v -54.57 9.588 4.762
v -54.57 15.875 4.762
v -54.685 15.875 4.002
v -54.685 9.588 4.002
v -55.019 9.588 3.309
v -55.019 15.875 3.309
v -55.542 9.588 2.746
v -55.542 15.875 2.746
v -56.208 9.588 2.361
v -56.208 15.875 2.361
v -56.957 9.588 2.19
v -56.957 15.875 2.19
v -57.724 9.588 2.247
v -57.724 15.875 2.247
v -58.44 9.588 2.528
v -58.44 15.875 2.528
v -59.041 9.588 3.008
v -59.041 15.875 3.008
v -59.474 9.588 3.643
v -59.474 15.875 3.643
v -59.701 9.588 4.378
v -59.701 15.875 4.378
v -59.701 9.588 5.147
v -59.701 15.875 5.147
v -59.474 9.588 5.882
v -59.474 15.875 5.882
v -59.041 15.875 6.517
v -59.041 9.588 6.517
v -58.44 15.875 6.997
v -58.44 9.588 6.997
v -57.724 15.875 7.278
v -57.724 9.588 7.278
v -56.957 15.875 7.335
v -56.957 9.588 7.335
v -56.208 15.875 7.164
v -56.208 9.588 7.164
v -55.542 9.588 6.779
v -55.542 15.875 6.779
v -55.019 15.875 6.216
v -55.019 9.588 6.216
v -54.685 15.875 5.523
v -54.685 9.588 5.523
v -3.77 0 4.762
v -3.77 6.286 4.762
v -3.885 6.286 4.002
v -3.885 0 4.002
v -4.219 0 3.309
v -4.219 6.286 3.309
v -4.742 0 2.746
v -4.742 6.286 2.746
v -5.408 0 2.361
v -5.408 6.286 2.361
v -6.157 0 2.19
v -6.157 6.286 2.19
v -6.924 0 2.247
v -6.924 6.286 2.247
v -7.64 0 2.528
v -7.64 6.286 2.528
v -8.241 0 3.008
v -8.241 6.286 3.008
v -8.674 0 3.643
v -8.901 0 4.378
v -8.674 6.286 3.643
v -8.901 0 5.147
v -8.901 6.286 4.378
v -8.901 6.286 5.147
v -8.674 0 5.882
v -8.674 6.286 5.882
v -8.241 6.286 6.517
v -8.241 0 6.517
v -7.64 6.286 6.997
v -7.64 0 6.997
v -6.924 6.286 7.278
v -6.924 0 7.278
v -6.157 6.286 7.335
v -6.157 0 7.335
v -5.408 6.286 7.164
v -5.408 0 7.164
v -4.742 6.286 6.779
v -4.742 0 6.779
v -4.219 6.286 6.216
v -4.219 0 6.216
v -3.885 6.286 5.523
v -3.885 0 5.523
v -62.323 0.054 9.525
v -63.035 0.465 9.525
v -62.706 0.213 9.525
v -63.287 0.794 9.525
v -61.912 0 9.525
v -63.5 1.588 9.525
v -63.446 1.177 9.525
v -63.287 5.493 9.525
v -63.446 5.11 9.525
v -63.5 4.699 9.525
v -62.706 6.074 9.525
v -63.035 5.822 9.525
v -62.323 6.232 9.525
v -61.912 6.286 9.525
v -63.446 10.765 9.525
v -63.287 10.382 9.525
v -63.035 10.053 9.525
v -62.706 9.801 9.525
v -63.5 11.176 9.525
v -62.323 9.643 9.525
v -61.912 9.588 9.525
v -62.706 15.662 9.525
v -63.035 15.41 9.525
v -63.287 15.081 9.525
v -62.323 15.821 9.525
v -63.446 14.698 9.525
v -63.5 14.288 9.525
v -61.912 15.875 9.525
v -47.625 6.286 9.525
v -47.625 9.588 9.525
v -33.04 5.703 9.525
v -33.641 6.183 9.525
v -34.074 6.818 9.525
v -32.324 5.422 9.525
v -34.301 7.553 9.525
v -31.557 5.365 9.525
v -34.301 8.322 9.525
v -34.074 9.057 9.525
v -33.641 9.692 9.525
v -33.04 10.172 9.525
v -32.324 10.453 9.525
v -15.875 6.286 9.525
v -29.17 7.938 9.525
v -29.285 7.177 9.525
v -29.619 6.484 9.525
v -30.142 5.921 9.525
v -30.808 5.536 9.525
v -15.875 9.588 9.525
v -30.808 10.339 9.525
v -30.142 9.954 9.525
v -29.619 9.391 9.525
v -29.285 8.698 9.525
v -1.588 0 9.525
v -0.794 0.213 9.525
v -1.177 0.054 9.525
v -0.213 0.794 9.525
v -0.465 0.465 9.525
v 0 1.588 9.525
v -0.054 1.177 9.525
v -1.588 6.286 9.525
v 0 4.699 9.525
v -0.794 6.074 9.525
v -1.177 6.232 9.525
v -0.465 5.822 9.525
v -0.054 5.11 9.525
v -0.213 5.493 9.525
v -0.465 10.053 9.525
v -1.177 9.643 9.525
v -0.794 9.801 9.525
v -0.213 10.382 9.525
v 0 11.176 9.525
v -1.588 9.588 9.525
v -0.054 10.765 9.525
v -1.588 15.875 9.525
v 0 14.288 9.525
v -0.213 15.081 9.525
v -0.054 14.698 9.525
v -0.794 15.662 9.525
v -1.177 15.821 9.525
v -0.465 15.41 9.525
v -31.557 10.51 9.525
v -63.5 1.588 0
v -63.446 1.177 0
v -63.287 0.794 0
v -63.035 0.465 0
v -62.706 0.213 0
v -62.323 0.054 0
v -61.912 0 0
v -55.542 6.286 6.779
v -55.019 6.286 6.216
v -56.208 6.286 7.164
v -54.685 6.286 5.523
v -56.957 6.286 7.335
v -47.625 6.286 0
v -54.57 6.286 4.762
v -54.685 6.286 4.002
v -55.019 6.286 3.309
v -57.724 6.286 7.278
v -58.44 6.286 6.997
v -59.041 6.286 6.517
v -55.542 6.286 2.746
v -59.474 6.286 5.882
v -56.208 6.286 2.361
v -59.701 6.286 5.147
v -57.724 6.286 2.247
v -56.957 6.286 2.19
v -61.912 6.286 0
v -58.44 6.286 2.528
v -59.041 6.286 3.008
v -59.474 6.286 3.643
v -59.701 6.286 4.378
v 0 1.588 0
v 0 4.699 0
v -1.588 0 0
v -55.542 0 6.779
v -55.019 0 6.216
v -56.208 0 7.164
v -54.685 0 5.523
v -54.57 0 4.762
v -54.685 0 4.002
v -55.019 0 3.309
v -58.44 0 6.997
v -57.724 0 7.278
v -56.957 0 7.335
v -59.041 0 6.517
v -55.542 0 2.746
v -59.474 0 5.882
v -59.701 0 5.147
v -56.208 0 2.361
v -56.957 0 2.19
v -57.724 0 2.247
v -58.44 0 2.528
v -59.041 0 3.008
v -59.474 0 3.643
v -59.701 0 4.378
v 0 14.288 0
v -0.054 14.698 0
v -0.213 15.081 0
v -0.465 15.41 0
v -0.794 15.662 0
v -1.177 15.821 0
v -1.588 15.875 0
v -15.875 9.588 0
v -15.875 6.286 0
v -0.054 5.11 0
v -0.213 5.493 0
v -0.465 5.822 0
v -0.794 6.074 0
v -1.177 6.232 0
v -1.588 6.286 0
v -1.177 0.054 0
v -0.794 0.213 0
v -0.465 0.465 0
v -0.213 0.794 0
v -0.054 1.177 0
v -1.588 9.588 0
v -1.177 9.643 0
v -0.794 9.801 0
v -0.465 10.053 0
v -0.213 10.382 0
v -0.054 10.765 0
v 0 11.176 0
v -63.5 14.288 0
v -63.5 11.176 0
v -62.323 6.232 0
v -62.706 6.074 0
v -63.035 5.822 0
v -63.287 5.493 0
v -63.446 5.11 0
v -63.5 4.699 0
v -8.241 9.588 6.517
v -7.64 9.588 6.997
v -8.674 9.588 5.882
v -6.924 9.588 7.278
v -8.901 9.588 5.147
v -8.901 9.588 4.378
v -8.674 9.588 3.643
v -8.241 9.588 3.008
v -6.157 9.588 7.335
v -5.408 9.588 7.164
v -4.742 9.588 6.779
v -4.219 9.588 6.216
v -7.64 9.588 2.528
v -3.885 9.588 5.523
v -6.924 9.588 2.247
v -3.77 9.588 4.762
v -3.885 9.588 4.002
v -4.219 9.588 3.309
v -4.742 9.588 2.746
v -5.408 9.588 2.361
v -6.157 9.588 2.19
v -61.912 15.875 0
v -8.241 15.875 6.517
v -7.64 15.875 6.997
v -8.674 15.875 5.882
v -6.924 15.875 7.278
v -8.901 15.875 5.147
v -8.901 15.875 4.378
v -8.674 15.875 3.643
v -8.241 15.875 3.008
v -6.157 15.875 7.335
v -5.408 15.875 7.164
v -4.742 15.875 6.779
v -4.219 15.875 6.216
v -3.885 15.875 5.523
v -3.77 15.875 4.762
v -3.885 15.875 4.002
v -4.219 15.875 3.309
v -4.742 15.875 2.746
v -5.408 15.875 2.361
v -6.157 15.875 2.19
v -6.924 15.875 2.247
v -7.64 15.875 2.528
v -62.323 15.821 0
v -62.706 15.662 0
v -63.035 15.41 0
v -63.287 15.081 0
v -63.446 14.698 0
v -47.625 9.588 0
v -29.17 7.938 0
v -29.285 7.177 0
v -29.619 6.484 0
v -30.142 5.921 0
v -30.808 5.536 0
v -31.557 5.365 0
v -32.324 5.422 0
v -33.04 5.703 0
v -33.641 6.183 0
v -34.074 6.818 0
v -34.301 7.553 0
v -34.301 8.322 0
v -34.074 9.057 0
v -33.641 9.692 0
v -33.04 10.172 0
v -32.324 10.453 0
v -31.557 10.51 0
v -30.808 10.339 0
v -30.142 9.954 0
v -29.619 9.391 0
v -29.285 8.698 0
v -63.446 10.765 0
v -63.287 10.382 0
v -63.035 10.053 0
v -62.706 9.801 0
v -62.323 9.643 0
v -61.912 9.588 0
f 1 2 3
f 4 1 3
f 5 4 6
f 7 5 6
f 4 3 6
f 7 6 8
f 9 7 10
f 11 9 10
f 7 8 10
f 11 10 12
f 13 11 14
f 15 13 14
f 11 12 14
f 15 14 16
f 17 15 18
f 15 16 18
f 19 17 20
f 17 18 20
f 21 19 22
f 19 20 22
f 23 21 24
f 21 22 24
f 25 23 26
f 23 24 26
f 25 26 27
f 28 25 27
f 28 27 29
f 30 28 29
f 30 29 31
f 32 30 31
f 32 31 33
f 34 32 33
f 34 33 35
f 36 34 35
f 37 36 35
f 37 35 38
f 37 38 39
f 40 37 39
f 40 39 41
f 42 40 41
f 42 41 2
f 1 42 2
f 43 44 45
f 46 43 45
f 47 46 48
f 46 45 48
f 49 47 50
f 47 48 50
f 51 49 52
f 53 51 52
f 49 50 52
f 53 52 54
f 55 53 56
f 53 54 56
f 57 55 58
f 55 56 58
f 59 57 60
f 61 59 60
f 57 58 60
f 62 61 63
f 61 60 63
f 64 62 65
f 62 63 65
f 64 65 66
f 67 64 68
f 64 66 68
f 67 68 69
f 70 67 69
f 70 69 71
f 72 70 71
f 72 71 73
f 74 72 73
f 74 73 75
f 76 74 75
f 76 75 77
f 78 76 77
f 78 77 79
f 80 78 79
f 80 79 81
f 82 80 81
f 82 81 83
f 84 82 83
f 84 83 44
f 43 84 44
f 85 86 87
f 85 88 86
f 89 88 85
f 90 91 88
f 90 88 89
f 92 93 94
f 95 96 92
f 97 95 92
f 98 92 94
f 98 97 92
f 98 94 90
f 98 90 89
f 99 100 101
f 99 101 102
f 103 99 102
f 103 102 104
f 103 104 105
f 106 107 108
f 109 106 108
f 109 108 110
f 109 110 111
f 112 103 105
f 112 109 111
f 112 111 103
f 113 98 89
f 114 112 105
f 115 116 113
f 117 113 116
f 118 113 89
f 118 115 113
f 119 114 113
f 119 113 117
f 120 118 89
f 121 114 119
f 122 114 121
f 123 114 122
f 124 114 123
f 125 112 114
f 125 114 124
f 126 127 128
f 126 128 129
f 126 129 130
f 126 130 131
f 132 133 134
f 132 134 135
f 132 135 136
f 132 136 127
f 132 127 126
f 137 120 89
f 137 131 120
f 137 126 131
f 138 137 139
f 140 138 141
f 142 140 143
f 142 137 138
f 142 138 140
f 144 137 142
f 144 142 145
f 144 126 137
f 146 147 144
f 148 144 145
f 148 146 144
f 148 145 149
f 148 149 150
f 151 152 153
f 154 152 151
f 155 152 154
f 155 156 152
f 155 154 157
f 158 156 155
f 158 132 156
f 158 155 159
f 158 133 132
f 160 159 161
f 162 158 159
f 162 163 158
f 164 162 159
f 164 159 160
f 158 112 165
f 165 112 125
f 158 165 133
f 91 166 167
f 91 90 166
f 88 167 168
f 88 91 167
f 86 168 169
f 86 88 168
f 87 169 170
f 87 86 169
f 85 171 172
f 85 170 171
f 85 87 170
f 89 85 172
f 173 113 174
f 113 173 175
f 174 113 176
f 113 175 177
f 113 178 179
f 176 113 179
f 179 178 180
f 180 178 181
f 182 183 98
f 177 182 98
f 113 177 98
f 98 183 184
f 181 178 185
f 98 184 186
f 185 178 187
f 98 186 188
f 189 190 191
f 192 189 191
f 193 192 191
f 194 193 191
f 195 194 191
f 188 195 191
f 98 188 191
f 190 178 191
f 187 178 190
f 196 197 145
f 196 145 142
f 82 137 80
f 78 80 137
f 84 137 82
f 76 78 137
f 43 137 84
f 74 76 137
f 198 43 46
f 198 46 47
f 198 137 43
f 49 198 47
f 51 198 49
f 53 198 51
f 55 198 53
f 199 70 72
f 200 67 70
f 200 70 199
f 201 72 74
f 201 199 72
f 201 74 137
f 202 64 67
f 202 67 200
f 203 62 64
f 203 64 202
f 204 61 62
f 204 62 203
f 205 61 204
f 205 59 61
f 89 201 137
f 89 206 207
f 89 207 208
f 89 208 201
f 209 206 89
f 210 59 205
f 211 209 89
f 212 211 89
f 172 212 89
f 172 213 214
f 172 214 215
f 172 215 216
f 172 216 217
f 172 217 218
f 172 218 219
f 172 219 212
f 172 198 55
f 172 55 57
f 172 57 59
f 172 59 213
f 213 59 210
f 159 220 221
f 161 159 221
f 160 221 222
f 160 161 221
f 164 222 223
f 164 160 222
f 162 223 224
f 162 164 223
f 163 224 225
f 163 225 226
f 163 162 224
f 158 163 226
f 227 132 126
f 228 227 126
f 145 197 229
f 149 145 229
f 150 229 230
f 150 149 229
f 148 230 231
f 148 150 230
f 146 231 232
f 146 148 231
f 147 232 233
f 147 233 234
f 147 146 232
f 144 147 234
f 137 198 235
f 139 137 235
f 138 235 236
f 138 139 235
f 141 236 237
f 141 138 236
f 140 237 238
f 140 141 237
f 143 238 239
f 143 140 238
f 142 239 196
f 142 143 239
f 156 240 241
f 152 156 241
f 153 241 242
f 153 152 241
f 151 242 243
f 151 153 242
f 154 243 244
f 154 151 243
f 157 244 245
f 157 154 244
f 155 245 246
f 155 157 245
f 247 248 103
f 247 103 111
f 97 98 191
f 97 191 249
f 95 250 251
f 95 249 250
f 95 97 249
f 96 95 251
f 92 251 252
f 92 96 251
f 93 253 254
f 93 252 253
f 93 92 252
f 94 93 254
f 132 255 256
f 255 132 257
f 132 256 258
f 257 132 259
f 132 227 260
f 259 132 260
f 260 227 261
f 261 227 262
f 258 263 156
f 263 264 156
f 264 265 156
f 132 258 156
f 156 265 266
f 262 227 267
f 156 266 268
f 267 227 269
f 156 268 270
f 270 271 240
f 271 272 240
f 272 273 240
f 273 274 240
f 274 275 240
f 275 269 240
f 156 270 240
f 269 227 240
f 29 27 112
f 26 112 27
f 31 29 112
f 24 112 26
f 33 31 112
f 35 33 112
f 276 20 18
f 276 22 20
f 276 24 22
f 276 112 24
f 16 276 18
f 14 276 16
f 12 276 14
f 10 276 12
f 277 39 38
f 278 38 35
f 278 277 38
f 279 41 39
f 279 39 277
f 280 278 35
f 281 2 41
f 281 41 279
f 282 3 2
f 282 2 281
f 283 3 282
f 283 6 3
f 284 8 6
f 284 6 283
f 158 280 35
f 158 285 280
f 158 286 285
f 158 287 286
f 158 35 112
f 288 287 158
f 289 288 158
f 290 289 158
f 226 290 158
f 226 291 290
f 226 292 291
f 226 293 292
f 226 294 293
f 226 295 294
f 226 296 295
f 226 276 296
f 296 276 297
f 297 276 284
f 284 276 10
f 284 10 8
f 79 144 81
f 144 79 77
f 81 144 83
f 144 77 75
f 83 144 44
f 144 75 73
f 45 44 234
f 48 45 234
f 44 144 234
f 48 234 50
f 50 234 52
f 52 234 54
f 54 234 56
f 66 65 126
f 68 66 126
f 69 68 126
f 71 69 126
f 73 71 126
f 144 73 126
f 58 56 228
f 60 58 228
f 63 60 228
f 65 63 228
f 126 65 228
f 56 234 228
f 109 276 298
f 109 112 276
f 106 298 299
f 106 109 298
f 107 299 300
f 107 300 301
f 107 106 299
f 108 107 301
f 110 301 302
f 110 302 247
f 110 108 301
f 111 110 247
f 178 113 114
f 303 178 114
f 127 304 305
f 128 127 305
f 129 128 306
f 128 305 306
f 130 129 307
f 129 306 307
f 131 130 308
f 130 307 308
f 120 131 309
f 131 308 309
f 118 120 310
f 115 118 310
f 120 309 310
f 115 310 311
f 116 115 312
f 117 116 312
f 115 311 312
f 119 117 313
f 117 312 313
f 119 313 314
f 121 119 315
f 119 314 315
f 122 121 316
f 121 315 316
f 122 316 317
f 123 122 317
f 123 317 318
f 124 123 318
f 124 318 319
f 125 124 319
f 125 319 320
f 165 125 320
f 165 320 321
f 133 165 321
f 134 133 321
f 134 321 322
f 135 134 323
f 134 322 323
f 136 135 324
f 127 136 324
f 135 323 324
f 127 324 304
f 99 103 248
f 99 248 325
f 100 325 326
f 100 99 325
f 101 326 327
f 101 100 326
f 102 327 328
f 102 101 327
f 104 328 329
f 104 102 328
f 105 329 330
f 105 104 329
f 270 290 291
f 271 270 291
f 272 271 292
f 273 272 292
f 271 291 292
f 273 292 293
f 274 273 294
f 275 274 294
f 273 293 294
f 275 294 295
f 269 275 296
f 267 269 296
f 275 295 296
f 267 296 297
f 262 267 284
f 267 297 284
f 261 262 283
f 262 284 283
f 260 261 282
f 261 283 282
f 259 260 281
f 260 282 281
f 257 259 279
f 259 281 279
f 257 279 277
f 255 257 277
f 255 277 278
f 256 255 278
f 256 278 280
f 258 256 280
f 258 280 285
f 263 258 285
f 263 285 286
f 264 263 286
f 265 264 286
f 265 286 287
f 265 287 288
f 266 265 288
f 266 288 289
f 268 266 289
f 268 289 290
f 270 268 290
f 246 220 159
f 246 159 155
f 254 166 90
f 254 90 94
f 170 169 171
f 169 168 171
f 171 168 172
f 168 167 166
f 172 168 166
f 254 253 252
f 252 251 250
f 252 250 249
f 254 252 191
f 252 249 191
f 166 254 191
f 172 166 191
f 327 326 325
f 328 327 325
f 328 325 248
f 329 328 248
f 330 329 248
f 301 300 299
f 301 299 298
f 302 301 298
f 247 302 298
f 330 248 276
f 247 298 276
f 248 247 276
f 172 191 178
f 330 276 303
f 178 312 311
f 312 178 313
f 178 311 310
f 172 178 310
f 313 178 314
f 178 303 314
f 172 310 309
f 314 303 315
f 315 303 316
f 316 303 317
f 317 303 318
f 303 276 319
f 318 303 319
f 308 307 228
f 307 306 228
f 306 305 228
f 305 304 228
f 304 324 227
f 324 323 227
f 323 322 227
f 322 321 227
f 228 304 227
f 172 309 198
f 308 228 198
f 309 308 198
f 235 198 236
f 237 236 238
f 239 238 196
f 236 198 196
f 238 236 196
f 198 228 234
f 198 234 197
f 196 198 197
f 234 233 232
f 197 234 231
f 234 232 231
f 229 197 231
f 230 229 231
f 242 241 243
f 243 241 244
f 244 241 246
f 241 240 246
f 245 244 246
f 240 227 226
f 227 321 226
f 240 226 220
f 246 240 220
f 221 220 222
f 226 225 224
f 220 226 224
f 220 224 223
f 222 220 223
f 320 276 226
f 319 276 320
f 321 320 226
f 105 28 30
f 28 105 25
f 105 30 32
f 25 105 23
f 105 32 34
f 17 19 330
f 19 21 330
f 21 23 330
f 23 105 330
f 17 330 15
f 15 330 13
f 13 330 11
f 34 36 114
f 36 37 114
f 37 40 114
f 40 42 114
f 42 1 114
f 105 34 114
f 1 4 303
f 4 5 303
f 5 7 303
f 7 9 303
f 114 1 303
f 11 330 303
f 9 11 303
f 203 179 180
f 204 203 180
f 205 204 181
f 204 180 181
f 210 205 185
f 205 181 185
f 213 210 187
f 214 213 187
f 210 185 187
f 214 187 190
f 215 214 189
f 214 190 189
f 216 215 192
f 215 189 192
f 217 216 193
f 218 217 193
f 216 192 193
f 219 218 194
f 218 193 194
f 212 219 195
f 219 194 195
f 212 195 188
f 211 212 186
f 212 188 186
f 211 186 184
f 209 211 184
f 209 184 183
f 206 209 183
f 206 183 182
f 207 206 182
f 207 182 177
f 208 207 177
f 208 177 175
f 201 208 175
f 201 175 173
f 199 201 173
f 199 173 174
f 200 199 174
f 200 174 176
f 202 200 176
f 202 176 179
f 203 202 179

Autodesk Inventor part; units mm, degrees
ref_plane "YZ Plane" through (0, 0, 0) normal (1, 0, 0) x (0, 1, 0)
ref_plane "XZ Plane" through (0, 0, 0) normal (0, 1, 0) x (-1, 0, 0)
ref_plane "XY Plane" through (0, 0, 0) normal (0, 0, 1) x (1, 0, 0)
sketch "Sketch1" plane through (0, 0, 0) normal (0, 0, 1) x (1, 0, 0)
  line L0 (0, 0) -> (-63.5, 0)
  line L1 (-63.5, 0) -> (-63.5, 15.875)
  line L2 (-63.5, 15.875) -> (0, 15.875)
  line L3 (0, 15.875) -> (0, 0)
  line L4 (0, 6.2865) -> (-63.5, 6.2865)
  line L5 (-63.5, 6.2865) -> (-63.5, 9.5885)
  line L6 (-63.5, 9.5885) -> (0, 9.5885)
  line L7 (0, 9.5885) -> (0, 6.2865)
  line L8 (-47.625, 15.875) -> (-15.875, 15.875)
  line L9 (-15.875, 15.875) -> (-15.875, 0)
  line L10 (-15.875, 0) -> (-47.625, 0)
  line L11 (-47.625, 0) -> (-47.625, 15.875)
  circle A0 centre (-31.75, 7.9375) radius 6.35
  circle A1 centre (-31.75, 7.9375) radius 2.5797
  line L12 (-6.35, 6.2865) -> (-6.35, 9.5885)
  line L13 (-57.15, 6.2865) -> (-57.15, 9.5885)
  point P0 (-15.875, 6.2865)
  point P1 (-15.875, 9.5885)
  point P2 (-47.625, 9.5885)
  point P3 (-47.625, 6.2865)
  dimension "d12" = 15.875
  dimension "d13" = 6.2865
  dimension "d14" = 3.302
  dimension "d15" = 15.875
  dimension "d16" = 15.875
  dimension "d17" = 7.9375
  dimension "d18" = 31.75
  dimension "d19" = 12.7
  dimension "d20" = 5.1594
  dimension "d33" = 6.35
  dimension "d34" = 6.35
  dimension "d35" = 50.8
  dimension "d36" = 63.5
extrude "Extrusion1" add sketch "Sketch1" along normal blind 9.525 contours L0 L9 L4 L3 | L0 L11 L4 A0 L9 | L0 L1 L4 L11 | L4 A0 L6 L9 | L6 L9 L2 L3 | L11 L6 A0 L4 | A0 L4 A1 | L4 A1 L6 A0 | L6 A0 L11 L2 L9 | A0 L6 A1 L4 | L6 L1 L2 L11 | L6 A1 A0
sketch "Sketch2" plane through (-63.5, 15.875, 0) normal (0, 1, 0) x (1, 0, 0)
  circle A0 centre (57.15, -4.7625) radius 2.5797
  circle A1 centre (6.35, -4.7625) radius 2.5797
  line L0 (63.5, 0) -> (0, 0) projected
  line L1 (63.5, 0) -> (63.5, -9.525) projected
  line L2 (0, 0) -> (0, -9.525) projected
  dimension "d25" = 4.7625
  dimension "d26" = 4.7625
  dimension "d27" = 6.35
  dimension "d28" = 6.35
  dimension "d29" = 5.1594
extrude "Extrusion3" cut sketch "Sketch2" against normal through all
fillet "Fillet2" radius 1.5875 8 edges at (-63.5, 0, 4.7625) (-63.5, 6.2865, 4.7625) (-63.5, 9.5885, 4.7625) (-63.5, 15.875, 4.7625) (0, 15.875, 4.7625) (0, 9.5885, 4.7625) (0, 6.2865, 4.7625) (0, 0, 4.7625)
equation "\"d13\" = -0.5 * d14 + 0.5 * d12"
equation "\"d16\" = d15"
equation "\"d17\" = 0.5 * d12"
equation "\"d18\" = 0.5 * d36"
equation "\"d33\" = d34"
equation "\"d26\" = d25"
equation "\"d27\" = d28"
properties part number "Connector"
